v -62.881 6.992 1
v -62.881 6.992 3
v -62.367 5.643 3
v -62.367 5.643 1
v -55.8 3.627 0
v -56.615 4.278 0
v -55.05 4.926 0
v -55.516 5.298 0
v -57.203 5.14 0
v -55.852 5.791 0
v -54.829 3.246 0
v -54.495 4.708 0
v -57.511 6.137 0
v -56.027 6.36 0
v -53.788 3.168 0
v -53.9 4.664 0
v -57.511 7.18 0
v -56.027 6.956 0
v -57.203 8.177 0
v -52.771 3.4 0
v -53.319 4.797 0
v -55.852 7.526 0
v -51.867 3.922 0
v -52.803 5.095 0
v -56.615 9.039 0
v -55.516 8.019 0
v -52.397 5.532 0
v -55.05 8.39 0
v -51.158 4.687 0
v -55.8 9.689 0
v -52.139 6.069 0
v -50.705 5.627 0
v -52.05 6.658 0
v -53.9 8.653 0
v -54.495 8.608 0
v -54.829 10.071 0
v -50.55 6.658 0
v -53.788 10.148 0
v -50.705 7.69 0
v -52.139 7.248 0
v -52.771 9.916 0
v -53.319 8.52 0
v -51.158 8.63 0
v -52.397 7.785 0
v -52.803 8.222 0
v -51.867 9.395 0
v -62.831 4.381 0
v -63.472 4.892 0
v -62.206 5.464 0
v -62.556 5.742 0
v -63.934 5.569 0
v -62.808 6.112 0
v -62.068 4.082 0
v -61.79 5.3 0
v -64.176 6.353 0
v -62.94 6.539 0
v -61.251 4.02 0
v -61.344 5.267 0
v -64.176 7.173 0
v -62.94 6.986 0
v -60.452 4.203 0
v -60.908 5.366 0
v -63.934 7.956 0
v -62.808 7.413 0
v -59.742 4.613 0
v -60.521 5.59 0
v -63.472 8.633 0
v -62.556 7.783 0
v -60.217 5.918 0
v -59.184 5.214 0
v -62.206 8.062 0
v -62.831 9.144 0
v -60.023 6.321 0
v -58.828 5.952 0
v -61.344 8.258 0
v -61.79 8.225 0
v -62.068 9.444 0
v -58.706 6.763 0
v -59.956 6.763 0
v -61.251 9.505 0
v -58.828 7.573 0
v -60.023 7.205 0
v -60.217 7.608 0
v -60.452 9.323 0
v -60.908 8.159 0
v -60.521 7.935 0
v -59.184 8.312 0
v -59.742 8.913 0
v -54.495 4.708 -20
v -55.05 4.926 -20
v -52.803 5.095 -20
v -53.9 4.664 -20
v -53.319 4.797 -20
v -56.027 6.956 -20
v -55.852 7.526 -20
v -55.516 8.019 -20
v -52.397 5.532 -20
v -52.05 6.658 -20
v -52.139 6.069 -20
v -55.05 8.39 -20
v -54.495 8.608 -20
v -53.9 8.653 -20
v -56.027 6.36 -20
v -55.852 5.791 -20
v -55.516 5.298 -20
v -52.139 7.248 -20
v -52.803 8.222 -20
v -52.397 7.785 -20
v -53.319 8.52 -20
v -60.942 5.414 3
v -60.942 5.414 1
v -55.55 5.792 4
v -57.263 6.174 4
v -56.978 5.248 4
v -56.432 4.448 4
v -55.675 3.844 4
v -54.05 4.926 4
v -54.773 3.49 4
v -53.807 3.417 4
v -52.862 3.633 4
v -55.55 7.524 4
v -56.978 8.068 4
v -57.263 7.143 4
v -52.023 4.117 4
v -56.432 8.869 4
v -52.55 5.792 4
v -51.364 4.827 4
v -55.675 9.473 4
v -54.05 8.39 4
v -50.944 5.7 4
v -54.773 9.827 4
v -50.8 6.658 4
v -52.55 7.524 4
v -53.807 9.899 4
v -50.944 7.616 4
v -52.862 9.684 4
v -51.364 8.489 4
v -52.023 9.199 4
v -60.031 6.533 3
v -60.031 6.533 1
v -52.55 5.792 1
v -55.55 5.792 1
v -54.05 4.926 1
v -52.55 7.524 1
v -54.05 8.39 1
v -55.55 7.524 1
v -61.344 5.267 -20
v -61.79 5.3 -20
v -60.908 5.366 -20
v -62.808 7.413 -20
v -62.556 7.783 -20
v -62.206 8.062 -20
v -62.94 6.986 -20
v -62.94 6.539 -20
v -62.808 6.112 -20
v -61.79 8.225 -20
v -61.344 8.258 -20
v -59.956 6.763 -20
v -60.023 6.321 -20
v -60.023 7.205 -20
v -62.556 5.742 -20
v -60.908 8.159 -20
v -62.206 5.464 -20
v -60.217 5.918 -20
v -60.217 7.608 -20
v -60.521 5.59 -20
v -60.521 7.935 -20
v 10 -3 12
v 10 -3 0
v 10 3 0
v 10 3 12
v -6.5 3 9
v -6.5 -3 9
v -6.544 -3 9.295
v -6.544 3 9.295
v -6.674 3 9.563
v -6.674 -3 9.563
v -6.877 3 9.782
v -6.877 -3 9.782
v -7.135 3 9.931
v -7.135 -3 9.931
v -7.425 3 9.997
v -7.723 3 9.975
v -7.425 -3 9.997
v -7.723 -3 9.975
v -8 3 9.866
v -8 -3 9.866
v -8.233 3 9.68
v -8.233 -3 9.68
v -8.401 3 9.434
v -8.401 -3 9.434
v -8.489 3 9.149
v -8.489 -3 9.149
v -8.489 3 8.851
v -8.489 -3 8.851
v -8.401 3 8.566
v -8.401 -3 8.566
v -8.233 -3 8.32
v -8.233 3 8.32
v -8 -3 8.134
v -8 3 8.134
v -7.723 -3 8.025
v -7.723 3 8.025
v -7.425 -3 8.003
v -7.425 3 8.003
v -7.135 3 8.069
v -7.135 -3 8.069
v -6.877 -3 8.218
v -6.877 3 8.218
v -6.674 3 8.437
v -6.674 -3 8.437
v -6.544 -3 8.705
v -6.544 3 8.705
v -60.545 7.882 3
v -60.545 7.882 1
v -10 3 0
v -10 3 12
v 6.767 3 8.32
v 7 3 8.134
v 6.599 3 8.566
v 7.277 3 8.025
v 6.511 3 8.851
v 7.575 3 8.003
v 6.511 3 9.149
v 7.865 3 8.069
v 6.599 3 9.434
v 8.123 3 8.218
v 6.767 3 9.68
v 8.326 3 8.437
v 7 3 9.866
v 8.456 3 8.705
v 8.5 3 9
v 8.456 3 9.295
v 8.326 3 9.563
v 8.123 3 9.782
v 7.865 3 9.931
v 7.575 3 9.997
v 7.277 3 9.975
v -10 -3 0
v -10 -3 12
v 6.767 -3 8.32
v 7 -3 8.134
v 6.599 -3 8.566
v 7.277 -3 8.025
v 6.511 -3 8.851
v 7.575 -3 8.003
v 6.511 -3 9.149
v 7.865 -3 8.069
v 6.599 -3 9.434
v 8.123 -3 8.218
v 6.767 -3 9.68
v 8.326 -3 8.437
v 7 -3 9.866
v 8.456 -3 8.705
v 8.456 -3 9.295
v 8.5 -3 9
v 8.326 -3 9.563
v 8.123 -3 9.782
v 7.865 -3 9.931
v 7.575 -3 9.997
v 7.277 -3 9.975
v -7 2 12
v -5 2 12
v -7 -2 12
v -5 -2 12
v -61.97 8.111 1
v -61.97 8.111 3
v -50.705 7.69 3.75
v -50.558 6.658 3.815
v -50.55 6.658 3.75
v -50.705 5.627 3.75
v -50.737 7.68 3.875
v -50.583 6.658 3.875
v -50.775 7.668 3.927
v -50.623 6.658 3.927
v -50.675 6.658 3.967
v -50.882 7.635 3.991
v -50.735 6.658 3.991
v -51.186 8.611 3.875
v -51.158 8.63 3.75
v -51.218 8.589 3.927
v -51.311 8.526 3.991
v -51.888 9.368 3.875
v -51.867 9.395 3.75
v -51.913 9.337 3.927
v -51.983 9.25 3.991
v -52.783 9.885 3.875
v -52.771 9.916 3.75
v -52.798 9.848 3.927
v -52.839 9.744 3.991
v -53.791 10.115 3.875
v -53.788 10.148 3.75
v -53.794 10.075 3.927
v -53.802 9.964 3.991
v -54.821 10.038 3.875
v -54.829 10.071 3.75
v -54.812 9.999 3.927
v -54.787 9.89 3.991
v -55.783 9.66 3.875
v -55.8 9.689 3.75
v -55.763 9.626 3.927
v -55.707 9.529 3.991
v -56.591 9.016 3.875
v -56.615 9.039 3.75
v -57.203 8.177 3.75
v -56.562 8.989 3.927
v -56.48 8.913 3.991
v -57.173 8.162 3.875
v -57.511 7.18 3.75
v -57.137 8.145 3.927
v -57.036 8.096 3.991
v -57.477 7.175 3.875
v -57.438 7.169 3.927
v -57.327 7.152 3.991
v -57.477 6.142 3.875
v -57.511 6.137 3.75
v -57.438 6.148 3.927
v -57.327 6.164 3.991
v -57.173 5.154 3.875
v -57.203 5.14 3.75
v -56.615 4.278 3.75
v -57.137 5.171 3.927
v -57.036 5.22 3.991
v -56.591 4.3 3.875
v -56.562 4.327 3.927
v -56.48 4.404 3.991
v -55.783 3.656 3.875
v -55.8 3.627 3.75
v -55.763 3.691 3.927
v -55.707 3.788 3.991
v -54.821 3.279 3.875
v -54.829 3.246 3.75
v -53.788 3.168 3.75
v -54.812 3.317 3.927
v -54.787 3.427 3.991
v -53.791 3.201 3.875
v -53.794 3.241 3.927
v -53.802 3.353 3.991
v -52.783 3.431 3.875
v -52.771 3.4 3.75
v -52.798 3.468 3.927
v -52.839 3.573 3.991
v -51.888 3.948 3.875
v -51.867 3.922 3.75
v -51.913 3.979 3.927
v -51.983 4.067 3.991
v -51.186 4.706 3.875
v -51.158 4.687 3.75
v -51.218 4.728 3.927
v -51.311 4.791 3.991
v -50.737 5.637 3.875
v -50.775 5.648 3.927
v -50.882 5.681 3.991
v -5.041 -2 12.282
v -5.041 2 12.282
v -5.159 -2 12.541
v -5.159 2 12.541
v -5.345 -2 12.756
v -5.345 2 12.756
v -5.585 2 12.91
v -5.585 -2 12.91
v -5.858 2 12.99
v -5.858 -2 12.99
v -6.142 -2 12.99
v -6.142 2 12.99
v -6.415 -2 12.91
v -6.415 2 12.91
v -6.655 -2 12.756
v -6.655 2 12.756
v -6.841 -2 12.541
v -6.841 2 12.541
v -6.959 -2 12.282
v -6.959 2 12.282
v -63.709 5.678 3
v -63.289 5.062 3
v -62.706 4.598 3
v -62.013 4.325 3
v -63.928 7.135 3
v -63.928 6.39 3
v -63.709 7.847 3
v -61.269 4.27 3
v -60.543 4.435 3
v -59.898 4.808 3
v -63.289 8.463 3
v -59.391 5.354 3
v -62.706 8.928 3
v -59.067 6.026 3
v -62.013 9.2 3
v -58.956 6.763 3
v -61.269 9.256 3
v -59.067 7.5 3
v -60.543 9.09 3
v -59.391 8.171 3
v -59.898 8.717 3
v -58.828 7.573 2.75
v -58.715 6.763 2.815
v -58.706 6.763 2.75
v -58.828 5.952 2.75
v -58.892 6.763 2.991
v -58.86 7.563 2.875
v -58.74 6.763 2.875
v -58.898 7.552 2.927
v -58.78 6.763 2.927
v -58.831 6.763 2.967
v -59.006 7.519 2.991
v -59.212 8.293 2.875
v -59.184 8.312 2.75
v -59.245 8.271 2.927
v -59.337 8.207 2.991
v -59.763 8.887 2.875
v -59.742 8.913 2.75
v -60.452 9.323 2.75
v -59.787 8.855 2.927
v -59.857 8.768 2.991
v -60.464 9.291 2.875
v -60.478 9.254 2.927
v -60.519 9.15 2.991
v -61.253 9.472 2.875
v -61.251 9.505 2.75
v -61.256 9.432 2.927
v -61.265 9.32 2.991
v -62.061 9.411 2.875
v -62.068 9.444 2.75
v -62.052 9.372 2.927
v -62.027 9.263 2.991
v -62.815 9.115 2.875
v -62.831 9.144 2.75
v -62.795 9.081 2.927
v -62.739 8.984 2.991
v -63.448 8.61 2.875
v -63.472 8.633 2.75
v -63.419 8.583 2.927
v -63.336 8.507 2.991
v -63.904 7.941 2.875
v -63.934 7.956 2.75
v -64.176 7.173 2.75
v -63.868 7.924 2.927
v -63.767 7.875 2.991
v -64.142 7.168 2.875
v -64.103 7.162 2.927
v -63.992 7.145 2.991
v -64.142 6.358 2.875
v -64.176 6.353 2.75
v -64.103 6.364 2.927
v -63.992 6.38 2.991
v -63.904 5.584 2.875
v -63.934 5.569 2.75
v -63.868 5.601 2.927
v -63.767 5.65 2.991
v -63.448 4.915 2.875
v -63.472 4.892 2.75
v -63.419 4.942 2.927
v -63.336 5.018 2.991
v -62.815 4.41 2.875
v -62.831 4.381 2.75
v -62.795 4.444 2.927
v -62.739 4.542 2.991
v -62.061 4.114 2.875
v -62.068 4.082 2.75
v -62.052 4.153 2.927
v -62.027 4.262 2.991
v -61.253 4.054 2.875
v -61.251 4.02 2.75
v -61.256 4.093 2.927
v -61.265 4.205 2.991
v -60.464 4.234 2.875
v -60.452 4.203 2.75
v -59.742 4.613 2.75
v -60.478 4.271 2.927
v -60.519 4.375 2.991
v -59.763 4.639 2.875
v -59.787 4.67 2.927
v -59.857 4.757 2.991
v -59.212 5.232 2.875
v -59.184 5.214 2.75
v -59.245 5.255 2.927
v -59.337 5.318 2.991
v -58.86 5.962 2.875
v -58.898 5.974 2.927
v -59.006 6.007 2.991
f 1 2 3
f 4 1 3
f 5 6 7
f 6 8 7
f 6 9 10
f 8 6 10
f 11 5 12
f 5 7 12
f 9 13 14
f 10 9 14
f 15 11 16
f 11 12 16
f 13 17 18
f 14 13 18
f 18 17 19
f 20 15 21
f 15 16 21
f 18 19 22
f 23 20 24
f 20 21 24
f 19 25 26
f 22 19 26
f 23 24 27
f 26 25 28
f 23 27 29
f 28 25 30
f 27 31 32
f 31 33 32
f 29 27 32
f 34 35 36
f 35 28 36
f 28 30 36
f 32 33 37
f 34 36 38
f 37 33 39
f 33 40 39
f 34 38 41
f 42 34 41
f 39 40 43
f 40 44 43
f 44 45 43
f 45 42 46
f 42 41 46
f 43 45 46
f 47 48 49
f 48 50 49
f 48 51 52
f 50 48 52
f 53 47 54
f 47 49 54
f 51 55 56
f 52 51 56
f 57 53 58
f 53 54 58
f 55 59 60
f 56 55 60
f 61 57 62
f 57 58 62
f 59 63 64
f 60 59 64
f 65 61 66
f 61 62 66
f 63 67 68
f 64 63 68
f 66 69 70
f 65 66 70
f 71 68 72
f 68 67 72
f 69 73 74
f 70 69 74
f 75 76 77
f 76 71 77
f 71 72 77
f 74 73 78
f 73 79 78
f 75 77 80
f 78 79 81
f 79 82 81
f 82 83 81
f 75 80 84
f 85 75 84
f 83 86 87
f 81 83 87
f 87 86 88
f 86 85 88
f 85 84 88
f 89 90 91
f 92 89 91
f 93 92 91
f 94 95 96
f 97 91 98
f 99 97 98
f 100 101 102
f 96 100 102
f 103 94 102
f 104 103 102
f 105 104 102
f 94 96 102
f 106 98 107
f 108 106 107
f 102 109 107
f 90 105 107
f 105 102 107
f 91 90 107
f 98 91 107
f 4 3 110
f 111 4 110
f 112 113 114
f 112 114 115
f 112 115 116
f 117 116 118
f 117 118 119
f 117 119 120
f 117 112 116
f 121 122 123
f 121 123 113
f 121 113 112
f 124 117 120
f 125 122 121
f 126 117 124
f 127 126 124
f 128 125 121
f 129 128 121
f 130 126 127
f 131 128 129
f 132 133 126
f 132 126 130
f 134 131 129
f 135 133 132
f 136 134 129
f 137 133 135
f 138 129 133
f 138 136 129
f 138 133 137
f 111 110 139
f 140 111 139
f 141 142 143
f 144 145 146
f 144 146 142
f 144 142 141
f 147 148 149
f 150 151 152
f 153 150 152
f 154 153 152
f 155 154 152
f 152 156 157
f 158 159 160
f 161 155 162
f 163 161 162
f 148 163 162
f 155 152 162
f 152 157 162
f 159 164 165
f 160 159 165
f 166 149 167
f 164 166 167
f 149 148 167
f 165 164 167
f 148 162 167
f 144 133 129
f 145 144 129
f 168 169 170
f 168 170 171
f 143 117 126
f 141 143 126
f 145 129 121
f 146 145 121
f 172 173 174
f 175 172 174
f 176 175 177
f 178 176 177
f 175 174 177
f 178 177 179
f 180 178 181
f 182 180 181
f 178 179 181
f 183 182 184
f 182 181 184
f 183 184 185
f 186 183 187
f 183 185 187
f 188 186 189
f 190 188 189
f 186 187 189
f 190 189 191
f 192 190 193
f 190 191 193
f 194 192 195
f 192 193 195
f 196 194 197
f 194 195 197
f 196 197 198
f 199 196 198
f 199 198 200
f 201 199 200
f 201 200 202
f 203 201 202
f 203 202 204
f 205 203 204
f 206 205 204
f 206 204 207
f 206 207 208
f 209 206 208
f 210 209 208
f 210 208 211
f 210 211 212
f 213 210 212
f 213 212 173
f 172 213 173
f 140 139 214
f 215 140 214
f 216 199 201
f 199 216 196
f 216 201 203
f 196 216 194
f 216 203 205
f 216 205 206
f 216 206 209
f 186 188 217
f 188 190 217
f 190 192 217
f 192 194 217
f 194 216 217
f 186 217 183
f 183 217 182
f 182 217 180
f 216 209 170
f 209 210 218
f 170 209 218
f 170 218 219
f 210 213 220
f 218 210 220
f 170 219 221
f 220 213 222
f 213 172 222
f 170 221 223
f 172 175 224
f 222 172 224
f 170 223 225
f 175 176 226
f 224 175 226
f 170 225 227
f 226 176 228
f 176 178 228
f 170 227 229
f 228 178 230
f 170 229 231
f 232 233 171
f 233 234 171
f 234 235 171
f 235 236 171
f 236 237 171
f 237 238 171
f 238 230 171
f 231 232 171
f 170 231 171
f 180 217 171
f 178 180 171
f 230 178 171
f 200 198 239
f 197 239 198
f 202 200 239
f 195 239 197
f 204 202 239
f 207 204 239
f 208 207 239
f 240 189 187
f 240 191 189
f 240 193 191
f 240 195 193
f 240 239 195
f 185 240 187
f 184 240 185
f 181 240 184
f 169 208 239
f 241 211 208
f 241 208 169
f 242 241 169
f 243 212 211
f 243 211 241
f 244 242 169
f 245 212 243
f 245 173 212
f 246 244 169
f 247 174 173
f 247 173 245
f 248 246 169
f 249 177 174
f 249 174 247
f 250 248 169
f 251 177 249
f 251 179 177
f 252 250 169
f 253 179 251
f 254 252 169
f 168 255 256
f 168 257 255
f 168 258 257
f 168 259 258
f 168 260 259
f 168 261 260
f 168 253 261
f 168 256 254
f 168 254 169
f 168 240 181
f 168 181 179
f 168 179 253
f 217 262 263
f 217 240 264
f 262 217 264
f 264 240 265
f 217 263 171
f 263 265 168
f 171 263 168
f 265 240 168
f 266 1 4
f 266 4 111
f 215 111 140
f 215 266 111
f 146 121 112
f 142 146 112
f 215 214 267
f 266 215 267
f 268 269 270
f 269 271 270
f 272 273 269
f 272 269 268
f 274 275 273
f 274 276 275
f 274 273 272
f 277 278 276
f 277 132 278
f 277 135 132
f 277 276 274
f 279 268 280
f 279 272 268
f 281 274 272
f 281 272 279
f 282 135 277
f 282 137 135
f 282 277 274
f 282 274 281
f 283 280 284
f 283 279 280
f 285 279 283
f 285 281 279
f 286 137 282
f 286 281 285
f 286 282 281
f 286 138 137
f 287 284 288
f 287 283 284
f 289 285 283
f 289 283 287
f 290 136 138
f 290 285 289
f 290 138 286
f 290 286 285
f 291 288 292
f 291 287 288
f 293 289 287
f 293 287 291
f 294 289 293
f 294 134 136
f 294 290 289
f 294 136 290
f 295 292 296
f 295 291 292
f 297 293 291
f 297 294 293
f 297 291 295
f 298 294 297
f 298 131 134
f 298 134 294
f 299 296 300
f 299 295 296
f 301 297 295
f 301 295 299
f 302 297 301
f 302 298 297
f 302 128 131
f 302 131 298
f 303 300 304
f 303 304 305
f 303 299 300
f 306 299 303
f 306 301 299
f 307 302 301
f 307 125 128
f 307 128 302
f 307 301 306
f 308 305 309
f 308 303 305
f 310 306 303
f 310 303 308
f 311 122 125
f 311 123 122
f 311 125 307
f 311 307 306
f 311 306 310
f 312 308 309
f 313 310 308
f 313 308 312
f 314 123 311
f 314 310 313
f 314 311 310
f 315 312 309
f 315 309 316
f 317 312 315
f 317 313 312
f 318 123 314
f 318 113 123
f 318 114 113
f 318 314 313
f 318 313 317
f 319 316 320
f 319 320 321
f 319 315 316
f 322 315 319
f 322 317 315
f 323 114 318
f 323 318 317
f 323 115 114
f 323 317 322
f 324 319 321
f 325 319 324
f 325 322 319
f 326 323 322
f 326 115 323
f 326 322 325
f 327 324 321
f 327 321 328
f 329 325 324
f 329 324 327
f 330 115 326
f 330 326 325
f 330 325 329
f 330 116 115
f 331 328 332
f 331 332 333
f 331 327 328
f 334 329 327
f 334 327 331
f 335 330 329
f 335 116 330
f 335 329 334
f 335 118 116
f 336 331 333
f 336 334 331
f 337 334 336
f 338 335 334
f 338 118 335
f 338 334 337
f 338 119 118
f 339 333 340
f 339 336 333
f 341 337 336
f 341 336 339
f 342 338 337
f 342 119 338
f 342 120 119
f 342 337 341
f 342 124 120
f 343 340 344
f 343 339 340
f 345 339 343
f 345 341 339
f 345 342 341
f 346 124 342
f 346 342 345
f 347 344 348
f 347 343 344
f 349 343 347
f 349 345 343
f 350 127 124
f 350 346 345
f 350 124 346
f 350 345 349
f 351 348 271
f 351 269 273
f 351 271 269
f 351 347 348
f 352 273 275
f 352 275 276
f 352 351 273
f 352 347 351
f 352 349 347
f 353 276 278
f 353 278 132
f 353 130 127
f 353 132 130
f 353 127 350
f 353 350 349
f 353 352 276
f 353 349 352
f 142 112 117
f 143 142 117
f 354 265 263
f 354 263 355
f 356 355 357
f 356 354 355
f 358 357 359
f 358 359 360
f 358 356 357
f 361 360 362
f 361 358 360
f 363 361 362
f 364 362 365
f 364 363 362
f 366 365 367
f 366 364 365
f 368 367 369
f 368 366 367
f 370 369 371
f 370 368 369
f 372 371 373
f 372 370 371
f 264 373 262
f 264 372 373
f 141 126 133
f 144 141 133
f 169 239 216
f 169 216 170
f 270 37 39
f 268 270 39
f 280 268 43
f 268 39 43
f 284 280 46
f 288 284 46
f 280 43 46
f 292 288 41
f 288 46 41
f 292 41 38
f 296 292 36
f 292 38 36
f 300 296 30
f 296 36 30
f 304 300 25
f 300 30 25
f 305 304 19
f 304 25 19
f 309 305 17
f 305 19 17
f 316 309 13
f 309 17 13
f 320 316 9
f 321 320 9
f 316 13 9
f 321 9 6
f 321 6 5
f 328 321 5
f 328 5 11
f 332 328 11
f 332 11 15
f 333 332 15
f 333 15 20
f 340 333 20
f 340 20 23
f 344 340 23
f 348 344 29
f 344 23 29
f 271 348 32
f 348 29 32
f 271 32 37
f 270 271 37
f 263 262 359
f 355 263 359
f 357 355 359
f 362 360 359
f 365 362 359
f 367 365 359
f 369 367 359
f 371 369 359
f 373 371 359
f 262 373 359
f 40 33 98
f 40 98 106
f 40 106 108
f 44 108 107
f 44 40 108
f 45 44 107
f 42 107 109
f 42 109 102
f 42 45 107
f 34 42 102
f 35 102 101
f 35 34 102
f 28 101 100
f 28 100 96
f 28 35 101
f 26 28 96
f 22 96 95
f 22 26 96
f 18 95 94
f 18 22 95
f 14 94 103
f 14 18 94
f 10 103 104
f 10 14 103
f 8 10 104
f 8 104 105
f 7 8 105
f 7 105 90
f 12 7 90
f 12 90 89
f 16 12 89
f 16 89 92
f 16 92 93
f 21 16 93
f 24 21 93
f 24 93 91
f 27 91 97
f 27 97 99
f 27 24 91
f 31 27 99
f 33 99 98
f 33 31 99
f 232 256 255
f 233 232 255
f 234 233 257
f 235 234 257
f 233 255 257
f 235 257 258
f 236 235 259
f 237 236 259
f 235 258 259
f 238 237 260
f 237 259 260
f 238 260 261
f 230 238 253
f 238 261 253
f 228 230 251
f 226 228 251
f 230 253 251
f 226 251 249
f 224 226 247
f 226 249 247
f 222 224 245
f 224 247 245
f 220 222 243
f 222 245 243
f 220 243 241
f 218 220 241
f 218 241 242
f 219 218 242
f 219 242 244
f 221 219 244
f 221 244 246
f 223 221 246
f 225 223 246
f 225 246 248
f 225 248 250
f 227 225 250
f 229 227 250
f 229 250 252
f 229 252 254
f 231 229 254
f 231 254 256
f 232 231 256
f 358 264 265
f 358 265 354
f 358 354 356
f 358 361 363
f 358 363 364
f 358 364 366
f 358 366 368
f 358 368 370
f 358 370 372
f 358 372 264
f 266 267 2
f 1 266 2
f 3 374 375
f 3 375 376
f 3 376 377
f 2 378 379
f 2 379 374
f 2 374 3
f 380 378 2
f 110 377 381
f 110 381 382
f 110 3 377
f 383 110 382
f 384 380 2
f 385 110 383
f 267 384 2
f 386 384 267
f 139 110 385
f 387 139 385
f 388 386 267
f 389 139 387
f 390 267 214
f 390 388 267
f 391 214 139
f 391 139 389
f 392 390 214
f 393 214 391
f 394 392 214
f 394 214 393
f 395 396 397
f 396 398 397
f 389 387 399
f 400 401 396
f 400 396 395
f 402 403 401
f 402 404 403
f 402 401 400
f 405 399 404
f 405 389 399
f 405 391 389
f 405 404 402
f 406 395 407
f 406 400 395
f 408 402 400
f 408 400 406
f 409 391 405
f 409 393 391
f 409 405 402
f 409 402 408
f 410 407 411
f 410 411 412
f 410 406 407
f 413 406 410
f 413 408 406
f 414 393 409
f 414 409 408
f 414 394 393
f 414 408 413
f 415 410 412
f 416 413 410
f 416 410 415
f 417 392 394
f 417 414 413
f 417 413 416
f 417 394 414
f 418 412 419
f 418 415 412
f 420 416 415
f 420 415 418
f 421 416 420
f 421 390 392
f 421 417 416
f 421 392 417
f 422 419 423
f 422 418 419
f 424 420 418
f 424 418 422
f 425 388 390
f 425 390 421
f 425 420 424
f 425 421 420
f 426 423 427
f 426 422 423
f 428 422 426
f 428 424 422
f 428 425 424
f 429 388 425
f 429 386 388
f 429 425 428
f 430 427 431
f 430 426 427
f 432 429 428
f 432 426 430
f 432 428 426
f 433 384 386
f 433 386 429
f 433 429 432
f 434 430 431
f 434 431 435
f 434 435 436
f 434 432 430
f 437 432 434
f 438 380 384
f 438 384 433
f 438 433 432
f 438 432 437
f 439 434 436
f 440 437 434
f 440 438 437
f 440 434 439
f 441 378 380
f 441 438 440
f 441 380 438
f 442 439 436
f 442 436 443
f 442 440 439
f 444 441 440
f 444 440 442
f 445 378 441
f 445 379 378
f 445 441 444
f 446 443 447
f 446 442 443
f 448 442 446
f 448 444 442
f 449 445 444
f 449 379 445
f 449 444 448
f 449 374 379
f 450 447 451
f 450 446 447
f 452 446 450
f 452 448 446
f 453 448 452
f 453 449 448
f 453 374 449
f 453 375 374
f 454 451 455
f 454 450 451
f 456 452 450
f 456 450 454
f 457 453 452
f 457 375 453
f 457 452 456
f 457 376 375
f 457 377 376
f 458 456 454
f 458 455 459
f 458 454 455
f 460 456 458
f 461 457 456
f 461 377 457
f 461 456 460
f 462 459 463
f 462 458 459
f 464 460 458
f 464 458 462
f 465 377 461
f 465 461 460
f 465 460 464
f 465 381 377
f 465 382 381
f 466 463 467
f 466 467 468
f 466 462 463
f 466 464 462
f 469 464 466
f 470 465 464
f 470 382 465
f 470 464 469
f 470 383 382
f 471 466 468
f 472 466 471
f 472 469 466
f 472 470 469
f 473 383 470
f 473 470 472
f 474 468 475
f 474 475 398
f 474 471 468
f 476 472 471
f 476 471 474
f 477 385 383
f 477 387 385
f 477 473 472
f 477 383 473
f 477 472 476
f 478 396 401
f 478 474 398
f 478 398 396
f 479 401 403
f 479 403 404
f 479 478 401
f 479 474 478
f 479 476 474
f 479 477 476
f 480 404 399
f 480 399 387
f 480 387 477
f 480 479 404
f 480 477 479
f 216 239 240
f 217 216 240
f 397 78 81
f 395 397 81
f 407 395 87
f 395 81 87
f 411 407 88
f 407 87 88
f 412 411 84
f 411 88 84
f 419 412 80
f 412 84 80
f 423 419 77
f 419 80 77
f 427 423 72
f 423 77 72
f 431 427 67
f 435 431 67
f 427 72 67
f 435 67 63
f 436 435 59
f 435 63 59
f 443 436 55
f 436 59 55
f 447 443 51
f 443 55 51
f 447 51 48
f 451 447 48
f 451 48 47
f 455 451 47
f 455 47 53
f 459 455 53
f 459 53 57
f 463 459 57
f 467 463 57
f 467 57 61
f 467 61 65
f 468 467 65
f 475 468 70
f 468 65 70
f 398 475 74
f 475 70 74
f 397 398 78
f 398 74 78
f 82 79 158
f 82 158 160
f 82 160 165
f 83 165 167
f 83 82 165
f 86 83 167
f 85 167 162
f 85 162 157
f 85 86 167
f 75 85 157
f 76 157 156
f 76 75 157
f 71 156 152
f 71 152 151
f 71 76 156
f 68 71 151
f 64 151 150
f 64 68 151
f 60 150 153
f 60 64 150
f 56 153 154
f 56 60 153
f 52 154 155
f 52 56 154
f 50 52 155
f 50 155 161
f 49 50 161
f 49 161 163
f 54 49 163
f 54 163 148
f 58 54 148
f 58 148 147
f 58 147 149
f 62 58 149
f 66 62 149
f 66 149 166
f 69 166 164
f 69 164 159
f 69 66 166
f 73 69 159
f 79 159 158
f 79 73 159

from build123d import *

# Parameters (mm, degrees)
F0_W      = 20
F0_H      = 12
F1_DEPTH  = 3
F2_R      = 1
F3_DEPTH  = 2
F4_R      = 1
F5_DEPTH  = 6.001
F6_R      = 1.5
F7_DEPTH  = 20
F8_R      = 2.75
F9_DEPTH  = 3
F11_DEPTH = 2
F12_R     = 0.25
F13_R     = 2
F14_DEPTH = 20
F15_R     = 3.5
F16_DEPTH = 4
F18_DEPTH = 3
F19_R     = 0.25


with BuildPart() as f1:
    # F0 (on Front) → F1 (new body, symmetric)
    with BuildSketch(Plane.XZ):
        with Locations((0, 6)):
            Rectangle(F0_W, F0_H)
    extrude(amount=F1_DEPTH, both=True)

    # F2 (on Front) → F3 (join, symmetric)
    with BuildSketch(Plane.XZ):
        with Locations((-6, 12)):
            Circle(F2_R)
    extrude(amount=F3_DEPTH, both=True)

    # F4 (on face) → F5 (cut, through all)
    with BuildSketch(Plane.XZ.offset(3)):
        with Locations((-7.5, 9)):
            Circle(F4_R)
        with Locations((7.5, 9)):
            Circle(F4_R)
    extrude(amount=-F5_DEPTH, mode=Mode.SUBTRACT)


with BuildPart() as f7:
    # F6 (on Top) → F7 (new body)
    with BuildSketch(Plane.XY):
        with Locations((-61.456285, 6.762655)):
            Circle(F6_R)
    extrude(amount=-F7_DEPTH)

    # F8 (on face) → F9 (join)
    with BuildSketch(Plane.XY):
        with Locations((-61.456285, 6.762655)):
            Circle(F8_R)
    extrude(amount=F9_DEPTH)

    # F10 (on face) → F11 (cut)
    with BuildSketch(Plane.XY.offset(3)):
        Polygon((-60.942254, 5.413914), (-60.031225, 6.533449), (-60.545257, 7.882191), (-61.970317, 8.111397), (-62.881346, 6.991862), (-62.367314, 5.64312), align=None)
    extrude(amount=-F11_DEPTH, mode=Mode.SUBTRACT)

    # F12
    f12_edges = [f7.edges().sort_by_distance(p)[0] for p in [
        (-64.206285, 6.762655, 3),
    ]]
    fillet(f12_edges, radius=F12_R)


with BuildPart() as f14:
    # F13 (on Top) → F14 (new body)
    with BuildSketch(Plane.XY):
        with Locations((-54.049708, 6.658276)):
            Circle(F13_R)
    extrude(amount=-F14_DEPTH)

    # F15 (on face) → F16 (join)
    with BuildSketch(Plane.XY):
        with Locations((-54.049708, 6.658276)):
            Circle(F15_R)
    extrude(amount=F16_DEPTH)

    # F17 (on face) → F18 (cut)
    with BuildSketch(Plane.XY.offset(4)):
        Polygon((-52.549708, 5.792251), (-52.549708, 7.524301), (-54.049708, 8.390327), (-55.549708, 7.524301), (-55.549708, 5.792251), (-54.049708, 4.926225), align=None)
    extrude(amount=-F18_DEPTH, mode=Mode.SUBTRACT)

    # F19
    f19_edges = [f14.edges().sort_by_distance(p)[0] for p in [
        (-57.549708, 6.658276, 4),
    ]]
    fillet(f19_edges, radius=F19_R)


solid = Compound([f1.part, f7.part, f14.part])
